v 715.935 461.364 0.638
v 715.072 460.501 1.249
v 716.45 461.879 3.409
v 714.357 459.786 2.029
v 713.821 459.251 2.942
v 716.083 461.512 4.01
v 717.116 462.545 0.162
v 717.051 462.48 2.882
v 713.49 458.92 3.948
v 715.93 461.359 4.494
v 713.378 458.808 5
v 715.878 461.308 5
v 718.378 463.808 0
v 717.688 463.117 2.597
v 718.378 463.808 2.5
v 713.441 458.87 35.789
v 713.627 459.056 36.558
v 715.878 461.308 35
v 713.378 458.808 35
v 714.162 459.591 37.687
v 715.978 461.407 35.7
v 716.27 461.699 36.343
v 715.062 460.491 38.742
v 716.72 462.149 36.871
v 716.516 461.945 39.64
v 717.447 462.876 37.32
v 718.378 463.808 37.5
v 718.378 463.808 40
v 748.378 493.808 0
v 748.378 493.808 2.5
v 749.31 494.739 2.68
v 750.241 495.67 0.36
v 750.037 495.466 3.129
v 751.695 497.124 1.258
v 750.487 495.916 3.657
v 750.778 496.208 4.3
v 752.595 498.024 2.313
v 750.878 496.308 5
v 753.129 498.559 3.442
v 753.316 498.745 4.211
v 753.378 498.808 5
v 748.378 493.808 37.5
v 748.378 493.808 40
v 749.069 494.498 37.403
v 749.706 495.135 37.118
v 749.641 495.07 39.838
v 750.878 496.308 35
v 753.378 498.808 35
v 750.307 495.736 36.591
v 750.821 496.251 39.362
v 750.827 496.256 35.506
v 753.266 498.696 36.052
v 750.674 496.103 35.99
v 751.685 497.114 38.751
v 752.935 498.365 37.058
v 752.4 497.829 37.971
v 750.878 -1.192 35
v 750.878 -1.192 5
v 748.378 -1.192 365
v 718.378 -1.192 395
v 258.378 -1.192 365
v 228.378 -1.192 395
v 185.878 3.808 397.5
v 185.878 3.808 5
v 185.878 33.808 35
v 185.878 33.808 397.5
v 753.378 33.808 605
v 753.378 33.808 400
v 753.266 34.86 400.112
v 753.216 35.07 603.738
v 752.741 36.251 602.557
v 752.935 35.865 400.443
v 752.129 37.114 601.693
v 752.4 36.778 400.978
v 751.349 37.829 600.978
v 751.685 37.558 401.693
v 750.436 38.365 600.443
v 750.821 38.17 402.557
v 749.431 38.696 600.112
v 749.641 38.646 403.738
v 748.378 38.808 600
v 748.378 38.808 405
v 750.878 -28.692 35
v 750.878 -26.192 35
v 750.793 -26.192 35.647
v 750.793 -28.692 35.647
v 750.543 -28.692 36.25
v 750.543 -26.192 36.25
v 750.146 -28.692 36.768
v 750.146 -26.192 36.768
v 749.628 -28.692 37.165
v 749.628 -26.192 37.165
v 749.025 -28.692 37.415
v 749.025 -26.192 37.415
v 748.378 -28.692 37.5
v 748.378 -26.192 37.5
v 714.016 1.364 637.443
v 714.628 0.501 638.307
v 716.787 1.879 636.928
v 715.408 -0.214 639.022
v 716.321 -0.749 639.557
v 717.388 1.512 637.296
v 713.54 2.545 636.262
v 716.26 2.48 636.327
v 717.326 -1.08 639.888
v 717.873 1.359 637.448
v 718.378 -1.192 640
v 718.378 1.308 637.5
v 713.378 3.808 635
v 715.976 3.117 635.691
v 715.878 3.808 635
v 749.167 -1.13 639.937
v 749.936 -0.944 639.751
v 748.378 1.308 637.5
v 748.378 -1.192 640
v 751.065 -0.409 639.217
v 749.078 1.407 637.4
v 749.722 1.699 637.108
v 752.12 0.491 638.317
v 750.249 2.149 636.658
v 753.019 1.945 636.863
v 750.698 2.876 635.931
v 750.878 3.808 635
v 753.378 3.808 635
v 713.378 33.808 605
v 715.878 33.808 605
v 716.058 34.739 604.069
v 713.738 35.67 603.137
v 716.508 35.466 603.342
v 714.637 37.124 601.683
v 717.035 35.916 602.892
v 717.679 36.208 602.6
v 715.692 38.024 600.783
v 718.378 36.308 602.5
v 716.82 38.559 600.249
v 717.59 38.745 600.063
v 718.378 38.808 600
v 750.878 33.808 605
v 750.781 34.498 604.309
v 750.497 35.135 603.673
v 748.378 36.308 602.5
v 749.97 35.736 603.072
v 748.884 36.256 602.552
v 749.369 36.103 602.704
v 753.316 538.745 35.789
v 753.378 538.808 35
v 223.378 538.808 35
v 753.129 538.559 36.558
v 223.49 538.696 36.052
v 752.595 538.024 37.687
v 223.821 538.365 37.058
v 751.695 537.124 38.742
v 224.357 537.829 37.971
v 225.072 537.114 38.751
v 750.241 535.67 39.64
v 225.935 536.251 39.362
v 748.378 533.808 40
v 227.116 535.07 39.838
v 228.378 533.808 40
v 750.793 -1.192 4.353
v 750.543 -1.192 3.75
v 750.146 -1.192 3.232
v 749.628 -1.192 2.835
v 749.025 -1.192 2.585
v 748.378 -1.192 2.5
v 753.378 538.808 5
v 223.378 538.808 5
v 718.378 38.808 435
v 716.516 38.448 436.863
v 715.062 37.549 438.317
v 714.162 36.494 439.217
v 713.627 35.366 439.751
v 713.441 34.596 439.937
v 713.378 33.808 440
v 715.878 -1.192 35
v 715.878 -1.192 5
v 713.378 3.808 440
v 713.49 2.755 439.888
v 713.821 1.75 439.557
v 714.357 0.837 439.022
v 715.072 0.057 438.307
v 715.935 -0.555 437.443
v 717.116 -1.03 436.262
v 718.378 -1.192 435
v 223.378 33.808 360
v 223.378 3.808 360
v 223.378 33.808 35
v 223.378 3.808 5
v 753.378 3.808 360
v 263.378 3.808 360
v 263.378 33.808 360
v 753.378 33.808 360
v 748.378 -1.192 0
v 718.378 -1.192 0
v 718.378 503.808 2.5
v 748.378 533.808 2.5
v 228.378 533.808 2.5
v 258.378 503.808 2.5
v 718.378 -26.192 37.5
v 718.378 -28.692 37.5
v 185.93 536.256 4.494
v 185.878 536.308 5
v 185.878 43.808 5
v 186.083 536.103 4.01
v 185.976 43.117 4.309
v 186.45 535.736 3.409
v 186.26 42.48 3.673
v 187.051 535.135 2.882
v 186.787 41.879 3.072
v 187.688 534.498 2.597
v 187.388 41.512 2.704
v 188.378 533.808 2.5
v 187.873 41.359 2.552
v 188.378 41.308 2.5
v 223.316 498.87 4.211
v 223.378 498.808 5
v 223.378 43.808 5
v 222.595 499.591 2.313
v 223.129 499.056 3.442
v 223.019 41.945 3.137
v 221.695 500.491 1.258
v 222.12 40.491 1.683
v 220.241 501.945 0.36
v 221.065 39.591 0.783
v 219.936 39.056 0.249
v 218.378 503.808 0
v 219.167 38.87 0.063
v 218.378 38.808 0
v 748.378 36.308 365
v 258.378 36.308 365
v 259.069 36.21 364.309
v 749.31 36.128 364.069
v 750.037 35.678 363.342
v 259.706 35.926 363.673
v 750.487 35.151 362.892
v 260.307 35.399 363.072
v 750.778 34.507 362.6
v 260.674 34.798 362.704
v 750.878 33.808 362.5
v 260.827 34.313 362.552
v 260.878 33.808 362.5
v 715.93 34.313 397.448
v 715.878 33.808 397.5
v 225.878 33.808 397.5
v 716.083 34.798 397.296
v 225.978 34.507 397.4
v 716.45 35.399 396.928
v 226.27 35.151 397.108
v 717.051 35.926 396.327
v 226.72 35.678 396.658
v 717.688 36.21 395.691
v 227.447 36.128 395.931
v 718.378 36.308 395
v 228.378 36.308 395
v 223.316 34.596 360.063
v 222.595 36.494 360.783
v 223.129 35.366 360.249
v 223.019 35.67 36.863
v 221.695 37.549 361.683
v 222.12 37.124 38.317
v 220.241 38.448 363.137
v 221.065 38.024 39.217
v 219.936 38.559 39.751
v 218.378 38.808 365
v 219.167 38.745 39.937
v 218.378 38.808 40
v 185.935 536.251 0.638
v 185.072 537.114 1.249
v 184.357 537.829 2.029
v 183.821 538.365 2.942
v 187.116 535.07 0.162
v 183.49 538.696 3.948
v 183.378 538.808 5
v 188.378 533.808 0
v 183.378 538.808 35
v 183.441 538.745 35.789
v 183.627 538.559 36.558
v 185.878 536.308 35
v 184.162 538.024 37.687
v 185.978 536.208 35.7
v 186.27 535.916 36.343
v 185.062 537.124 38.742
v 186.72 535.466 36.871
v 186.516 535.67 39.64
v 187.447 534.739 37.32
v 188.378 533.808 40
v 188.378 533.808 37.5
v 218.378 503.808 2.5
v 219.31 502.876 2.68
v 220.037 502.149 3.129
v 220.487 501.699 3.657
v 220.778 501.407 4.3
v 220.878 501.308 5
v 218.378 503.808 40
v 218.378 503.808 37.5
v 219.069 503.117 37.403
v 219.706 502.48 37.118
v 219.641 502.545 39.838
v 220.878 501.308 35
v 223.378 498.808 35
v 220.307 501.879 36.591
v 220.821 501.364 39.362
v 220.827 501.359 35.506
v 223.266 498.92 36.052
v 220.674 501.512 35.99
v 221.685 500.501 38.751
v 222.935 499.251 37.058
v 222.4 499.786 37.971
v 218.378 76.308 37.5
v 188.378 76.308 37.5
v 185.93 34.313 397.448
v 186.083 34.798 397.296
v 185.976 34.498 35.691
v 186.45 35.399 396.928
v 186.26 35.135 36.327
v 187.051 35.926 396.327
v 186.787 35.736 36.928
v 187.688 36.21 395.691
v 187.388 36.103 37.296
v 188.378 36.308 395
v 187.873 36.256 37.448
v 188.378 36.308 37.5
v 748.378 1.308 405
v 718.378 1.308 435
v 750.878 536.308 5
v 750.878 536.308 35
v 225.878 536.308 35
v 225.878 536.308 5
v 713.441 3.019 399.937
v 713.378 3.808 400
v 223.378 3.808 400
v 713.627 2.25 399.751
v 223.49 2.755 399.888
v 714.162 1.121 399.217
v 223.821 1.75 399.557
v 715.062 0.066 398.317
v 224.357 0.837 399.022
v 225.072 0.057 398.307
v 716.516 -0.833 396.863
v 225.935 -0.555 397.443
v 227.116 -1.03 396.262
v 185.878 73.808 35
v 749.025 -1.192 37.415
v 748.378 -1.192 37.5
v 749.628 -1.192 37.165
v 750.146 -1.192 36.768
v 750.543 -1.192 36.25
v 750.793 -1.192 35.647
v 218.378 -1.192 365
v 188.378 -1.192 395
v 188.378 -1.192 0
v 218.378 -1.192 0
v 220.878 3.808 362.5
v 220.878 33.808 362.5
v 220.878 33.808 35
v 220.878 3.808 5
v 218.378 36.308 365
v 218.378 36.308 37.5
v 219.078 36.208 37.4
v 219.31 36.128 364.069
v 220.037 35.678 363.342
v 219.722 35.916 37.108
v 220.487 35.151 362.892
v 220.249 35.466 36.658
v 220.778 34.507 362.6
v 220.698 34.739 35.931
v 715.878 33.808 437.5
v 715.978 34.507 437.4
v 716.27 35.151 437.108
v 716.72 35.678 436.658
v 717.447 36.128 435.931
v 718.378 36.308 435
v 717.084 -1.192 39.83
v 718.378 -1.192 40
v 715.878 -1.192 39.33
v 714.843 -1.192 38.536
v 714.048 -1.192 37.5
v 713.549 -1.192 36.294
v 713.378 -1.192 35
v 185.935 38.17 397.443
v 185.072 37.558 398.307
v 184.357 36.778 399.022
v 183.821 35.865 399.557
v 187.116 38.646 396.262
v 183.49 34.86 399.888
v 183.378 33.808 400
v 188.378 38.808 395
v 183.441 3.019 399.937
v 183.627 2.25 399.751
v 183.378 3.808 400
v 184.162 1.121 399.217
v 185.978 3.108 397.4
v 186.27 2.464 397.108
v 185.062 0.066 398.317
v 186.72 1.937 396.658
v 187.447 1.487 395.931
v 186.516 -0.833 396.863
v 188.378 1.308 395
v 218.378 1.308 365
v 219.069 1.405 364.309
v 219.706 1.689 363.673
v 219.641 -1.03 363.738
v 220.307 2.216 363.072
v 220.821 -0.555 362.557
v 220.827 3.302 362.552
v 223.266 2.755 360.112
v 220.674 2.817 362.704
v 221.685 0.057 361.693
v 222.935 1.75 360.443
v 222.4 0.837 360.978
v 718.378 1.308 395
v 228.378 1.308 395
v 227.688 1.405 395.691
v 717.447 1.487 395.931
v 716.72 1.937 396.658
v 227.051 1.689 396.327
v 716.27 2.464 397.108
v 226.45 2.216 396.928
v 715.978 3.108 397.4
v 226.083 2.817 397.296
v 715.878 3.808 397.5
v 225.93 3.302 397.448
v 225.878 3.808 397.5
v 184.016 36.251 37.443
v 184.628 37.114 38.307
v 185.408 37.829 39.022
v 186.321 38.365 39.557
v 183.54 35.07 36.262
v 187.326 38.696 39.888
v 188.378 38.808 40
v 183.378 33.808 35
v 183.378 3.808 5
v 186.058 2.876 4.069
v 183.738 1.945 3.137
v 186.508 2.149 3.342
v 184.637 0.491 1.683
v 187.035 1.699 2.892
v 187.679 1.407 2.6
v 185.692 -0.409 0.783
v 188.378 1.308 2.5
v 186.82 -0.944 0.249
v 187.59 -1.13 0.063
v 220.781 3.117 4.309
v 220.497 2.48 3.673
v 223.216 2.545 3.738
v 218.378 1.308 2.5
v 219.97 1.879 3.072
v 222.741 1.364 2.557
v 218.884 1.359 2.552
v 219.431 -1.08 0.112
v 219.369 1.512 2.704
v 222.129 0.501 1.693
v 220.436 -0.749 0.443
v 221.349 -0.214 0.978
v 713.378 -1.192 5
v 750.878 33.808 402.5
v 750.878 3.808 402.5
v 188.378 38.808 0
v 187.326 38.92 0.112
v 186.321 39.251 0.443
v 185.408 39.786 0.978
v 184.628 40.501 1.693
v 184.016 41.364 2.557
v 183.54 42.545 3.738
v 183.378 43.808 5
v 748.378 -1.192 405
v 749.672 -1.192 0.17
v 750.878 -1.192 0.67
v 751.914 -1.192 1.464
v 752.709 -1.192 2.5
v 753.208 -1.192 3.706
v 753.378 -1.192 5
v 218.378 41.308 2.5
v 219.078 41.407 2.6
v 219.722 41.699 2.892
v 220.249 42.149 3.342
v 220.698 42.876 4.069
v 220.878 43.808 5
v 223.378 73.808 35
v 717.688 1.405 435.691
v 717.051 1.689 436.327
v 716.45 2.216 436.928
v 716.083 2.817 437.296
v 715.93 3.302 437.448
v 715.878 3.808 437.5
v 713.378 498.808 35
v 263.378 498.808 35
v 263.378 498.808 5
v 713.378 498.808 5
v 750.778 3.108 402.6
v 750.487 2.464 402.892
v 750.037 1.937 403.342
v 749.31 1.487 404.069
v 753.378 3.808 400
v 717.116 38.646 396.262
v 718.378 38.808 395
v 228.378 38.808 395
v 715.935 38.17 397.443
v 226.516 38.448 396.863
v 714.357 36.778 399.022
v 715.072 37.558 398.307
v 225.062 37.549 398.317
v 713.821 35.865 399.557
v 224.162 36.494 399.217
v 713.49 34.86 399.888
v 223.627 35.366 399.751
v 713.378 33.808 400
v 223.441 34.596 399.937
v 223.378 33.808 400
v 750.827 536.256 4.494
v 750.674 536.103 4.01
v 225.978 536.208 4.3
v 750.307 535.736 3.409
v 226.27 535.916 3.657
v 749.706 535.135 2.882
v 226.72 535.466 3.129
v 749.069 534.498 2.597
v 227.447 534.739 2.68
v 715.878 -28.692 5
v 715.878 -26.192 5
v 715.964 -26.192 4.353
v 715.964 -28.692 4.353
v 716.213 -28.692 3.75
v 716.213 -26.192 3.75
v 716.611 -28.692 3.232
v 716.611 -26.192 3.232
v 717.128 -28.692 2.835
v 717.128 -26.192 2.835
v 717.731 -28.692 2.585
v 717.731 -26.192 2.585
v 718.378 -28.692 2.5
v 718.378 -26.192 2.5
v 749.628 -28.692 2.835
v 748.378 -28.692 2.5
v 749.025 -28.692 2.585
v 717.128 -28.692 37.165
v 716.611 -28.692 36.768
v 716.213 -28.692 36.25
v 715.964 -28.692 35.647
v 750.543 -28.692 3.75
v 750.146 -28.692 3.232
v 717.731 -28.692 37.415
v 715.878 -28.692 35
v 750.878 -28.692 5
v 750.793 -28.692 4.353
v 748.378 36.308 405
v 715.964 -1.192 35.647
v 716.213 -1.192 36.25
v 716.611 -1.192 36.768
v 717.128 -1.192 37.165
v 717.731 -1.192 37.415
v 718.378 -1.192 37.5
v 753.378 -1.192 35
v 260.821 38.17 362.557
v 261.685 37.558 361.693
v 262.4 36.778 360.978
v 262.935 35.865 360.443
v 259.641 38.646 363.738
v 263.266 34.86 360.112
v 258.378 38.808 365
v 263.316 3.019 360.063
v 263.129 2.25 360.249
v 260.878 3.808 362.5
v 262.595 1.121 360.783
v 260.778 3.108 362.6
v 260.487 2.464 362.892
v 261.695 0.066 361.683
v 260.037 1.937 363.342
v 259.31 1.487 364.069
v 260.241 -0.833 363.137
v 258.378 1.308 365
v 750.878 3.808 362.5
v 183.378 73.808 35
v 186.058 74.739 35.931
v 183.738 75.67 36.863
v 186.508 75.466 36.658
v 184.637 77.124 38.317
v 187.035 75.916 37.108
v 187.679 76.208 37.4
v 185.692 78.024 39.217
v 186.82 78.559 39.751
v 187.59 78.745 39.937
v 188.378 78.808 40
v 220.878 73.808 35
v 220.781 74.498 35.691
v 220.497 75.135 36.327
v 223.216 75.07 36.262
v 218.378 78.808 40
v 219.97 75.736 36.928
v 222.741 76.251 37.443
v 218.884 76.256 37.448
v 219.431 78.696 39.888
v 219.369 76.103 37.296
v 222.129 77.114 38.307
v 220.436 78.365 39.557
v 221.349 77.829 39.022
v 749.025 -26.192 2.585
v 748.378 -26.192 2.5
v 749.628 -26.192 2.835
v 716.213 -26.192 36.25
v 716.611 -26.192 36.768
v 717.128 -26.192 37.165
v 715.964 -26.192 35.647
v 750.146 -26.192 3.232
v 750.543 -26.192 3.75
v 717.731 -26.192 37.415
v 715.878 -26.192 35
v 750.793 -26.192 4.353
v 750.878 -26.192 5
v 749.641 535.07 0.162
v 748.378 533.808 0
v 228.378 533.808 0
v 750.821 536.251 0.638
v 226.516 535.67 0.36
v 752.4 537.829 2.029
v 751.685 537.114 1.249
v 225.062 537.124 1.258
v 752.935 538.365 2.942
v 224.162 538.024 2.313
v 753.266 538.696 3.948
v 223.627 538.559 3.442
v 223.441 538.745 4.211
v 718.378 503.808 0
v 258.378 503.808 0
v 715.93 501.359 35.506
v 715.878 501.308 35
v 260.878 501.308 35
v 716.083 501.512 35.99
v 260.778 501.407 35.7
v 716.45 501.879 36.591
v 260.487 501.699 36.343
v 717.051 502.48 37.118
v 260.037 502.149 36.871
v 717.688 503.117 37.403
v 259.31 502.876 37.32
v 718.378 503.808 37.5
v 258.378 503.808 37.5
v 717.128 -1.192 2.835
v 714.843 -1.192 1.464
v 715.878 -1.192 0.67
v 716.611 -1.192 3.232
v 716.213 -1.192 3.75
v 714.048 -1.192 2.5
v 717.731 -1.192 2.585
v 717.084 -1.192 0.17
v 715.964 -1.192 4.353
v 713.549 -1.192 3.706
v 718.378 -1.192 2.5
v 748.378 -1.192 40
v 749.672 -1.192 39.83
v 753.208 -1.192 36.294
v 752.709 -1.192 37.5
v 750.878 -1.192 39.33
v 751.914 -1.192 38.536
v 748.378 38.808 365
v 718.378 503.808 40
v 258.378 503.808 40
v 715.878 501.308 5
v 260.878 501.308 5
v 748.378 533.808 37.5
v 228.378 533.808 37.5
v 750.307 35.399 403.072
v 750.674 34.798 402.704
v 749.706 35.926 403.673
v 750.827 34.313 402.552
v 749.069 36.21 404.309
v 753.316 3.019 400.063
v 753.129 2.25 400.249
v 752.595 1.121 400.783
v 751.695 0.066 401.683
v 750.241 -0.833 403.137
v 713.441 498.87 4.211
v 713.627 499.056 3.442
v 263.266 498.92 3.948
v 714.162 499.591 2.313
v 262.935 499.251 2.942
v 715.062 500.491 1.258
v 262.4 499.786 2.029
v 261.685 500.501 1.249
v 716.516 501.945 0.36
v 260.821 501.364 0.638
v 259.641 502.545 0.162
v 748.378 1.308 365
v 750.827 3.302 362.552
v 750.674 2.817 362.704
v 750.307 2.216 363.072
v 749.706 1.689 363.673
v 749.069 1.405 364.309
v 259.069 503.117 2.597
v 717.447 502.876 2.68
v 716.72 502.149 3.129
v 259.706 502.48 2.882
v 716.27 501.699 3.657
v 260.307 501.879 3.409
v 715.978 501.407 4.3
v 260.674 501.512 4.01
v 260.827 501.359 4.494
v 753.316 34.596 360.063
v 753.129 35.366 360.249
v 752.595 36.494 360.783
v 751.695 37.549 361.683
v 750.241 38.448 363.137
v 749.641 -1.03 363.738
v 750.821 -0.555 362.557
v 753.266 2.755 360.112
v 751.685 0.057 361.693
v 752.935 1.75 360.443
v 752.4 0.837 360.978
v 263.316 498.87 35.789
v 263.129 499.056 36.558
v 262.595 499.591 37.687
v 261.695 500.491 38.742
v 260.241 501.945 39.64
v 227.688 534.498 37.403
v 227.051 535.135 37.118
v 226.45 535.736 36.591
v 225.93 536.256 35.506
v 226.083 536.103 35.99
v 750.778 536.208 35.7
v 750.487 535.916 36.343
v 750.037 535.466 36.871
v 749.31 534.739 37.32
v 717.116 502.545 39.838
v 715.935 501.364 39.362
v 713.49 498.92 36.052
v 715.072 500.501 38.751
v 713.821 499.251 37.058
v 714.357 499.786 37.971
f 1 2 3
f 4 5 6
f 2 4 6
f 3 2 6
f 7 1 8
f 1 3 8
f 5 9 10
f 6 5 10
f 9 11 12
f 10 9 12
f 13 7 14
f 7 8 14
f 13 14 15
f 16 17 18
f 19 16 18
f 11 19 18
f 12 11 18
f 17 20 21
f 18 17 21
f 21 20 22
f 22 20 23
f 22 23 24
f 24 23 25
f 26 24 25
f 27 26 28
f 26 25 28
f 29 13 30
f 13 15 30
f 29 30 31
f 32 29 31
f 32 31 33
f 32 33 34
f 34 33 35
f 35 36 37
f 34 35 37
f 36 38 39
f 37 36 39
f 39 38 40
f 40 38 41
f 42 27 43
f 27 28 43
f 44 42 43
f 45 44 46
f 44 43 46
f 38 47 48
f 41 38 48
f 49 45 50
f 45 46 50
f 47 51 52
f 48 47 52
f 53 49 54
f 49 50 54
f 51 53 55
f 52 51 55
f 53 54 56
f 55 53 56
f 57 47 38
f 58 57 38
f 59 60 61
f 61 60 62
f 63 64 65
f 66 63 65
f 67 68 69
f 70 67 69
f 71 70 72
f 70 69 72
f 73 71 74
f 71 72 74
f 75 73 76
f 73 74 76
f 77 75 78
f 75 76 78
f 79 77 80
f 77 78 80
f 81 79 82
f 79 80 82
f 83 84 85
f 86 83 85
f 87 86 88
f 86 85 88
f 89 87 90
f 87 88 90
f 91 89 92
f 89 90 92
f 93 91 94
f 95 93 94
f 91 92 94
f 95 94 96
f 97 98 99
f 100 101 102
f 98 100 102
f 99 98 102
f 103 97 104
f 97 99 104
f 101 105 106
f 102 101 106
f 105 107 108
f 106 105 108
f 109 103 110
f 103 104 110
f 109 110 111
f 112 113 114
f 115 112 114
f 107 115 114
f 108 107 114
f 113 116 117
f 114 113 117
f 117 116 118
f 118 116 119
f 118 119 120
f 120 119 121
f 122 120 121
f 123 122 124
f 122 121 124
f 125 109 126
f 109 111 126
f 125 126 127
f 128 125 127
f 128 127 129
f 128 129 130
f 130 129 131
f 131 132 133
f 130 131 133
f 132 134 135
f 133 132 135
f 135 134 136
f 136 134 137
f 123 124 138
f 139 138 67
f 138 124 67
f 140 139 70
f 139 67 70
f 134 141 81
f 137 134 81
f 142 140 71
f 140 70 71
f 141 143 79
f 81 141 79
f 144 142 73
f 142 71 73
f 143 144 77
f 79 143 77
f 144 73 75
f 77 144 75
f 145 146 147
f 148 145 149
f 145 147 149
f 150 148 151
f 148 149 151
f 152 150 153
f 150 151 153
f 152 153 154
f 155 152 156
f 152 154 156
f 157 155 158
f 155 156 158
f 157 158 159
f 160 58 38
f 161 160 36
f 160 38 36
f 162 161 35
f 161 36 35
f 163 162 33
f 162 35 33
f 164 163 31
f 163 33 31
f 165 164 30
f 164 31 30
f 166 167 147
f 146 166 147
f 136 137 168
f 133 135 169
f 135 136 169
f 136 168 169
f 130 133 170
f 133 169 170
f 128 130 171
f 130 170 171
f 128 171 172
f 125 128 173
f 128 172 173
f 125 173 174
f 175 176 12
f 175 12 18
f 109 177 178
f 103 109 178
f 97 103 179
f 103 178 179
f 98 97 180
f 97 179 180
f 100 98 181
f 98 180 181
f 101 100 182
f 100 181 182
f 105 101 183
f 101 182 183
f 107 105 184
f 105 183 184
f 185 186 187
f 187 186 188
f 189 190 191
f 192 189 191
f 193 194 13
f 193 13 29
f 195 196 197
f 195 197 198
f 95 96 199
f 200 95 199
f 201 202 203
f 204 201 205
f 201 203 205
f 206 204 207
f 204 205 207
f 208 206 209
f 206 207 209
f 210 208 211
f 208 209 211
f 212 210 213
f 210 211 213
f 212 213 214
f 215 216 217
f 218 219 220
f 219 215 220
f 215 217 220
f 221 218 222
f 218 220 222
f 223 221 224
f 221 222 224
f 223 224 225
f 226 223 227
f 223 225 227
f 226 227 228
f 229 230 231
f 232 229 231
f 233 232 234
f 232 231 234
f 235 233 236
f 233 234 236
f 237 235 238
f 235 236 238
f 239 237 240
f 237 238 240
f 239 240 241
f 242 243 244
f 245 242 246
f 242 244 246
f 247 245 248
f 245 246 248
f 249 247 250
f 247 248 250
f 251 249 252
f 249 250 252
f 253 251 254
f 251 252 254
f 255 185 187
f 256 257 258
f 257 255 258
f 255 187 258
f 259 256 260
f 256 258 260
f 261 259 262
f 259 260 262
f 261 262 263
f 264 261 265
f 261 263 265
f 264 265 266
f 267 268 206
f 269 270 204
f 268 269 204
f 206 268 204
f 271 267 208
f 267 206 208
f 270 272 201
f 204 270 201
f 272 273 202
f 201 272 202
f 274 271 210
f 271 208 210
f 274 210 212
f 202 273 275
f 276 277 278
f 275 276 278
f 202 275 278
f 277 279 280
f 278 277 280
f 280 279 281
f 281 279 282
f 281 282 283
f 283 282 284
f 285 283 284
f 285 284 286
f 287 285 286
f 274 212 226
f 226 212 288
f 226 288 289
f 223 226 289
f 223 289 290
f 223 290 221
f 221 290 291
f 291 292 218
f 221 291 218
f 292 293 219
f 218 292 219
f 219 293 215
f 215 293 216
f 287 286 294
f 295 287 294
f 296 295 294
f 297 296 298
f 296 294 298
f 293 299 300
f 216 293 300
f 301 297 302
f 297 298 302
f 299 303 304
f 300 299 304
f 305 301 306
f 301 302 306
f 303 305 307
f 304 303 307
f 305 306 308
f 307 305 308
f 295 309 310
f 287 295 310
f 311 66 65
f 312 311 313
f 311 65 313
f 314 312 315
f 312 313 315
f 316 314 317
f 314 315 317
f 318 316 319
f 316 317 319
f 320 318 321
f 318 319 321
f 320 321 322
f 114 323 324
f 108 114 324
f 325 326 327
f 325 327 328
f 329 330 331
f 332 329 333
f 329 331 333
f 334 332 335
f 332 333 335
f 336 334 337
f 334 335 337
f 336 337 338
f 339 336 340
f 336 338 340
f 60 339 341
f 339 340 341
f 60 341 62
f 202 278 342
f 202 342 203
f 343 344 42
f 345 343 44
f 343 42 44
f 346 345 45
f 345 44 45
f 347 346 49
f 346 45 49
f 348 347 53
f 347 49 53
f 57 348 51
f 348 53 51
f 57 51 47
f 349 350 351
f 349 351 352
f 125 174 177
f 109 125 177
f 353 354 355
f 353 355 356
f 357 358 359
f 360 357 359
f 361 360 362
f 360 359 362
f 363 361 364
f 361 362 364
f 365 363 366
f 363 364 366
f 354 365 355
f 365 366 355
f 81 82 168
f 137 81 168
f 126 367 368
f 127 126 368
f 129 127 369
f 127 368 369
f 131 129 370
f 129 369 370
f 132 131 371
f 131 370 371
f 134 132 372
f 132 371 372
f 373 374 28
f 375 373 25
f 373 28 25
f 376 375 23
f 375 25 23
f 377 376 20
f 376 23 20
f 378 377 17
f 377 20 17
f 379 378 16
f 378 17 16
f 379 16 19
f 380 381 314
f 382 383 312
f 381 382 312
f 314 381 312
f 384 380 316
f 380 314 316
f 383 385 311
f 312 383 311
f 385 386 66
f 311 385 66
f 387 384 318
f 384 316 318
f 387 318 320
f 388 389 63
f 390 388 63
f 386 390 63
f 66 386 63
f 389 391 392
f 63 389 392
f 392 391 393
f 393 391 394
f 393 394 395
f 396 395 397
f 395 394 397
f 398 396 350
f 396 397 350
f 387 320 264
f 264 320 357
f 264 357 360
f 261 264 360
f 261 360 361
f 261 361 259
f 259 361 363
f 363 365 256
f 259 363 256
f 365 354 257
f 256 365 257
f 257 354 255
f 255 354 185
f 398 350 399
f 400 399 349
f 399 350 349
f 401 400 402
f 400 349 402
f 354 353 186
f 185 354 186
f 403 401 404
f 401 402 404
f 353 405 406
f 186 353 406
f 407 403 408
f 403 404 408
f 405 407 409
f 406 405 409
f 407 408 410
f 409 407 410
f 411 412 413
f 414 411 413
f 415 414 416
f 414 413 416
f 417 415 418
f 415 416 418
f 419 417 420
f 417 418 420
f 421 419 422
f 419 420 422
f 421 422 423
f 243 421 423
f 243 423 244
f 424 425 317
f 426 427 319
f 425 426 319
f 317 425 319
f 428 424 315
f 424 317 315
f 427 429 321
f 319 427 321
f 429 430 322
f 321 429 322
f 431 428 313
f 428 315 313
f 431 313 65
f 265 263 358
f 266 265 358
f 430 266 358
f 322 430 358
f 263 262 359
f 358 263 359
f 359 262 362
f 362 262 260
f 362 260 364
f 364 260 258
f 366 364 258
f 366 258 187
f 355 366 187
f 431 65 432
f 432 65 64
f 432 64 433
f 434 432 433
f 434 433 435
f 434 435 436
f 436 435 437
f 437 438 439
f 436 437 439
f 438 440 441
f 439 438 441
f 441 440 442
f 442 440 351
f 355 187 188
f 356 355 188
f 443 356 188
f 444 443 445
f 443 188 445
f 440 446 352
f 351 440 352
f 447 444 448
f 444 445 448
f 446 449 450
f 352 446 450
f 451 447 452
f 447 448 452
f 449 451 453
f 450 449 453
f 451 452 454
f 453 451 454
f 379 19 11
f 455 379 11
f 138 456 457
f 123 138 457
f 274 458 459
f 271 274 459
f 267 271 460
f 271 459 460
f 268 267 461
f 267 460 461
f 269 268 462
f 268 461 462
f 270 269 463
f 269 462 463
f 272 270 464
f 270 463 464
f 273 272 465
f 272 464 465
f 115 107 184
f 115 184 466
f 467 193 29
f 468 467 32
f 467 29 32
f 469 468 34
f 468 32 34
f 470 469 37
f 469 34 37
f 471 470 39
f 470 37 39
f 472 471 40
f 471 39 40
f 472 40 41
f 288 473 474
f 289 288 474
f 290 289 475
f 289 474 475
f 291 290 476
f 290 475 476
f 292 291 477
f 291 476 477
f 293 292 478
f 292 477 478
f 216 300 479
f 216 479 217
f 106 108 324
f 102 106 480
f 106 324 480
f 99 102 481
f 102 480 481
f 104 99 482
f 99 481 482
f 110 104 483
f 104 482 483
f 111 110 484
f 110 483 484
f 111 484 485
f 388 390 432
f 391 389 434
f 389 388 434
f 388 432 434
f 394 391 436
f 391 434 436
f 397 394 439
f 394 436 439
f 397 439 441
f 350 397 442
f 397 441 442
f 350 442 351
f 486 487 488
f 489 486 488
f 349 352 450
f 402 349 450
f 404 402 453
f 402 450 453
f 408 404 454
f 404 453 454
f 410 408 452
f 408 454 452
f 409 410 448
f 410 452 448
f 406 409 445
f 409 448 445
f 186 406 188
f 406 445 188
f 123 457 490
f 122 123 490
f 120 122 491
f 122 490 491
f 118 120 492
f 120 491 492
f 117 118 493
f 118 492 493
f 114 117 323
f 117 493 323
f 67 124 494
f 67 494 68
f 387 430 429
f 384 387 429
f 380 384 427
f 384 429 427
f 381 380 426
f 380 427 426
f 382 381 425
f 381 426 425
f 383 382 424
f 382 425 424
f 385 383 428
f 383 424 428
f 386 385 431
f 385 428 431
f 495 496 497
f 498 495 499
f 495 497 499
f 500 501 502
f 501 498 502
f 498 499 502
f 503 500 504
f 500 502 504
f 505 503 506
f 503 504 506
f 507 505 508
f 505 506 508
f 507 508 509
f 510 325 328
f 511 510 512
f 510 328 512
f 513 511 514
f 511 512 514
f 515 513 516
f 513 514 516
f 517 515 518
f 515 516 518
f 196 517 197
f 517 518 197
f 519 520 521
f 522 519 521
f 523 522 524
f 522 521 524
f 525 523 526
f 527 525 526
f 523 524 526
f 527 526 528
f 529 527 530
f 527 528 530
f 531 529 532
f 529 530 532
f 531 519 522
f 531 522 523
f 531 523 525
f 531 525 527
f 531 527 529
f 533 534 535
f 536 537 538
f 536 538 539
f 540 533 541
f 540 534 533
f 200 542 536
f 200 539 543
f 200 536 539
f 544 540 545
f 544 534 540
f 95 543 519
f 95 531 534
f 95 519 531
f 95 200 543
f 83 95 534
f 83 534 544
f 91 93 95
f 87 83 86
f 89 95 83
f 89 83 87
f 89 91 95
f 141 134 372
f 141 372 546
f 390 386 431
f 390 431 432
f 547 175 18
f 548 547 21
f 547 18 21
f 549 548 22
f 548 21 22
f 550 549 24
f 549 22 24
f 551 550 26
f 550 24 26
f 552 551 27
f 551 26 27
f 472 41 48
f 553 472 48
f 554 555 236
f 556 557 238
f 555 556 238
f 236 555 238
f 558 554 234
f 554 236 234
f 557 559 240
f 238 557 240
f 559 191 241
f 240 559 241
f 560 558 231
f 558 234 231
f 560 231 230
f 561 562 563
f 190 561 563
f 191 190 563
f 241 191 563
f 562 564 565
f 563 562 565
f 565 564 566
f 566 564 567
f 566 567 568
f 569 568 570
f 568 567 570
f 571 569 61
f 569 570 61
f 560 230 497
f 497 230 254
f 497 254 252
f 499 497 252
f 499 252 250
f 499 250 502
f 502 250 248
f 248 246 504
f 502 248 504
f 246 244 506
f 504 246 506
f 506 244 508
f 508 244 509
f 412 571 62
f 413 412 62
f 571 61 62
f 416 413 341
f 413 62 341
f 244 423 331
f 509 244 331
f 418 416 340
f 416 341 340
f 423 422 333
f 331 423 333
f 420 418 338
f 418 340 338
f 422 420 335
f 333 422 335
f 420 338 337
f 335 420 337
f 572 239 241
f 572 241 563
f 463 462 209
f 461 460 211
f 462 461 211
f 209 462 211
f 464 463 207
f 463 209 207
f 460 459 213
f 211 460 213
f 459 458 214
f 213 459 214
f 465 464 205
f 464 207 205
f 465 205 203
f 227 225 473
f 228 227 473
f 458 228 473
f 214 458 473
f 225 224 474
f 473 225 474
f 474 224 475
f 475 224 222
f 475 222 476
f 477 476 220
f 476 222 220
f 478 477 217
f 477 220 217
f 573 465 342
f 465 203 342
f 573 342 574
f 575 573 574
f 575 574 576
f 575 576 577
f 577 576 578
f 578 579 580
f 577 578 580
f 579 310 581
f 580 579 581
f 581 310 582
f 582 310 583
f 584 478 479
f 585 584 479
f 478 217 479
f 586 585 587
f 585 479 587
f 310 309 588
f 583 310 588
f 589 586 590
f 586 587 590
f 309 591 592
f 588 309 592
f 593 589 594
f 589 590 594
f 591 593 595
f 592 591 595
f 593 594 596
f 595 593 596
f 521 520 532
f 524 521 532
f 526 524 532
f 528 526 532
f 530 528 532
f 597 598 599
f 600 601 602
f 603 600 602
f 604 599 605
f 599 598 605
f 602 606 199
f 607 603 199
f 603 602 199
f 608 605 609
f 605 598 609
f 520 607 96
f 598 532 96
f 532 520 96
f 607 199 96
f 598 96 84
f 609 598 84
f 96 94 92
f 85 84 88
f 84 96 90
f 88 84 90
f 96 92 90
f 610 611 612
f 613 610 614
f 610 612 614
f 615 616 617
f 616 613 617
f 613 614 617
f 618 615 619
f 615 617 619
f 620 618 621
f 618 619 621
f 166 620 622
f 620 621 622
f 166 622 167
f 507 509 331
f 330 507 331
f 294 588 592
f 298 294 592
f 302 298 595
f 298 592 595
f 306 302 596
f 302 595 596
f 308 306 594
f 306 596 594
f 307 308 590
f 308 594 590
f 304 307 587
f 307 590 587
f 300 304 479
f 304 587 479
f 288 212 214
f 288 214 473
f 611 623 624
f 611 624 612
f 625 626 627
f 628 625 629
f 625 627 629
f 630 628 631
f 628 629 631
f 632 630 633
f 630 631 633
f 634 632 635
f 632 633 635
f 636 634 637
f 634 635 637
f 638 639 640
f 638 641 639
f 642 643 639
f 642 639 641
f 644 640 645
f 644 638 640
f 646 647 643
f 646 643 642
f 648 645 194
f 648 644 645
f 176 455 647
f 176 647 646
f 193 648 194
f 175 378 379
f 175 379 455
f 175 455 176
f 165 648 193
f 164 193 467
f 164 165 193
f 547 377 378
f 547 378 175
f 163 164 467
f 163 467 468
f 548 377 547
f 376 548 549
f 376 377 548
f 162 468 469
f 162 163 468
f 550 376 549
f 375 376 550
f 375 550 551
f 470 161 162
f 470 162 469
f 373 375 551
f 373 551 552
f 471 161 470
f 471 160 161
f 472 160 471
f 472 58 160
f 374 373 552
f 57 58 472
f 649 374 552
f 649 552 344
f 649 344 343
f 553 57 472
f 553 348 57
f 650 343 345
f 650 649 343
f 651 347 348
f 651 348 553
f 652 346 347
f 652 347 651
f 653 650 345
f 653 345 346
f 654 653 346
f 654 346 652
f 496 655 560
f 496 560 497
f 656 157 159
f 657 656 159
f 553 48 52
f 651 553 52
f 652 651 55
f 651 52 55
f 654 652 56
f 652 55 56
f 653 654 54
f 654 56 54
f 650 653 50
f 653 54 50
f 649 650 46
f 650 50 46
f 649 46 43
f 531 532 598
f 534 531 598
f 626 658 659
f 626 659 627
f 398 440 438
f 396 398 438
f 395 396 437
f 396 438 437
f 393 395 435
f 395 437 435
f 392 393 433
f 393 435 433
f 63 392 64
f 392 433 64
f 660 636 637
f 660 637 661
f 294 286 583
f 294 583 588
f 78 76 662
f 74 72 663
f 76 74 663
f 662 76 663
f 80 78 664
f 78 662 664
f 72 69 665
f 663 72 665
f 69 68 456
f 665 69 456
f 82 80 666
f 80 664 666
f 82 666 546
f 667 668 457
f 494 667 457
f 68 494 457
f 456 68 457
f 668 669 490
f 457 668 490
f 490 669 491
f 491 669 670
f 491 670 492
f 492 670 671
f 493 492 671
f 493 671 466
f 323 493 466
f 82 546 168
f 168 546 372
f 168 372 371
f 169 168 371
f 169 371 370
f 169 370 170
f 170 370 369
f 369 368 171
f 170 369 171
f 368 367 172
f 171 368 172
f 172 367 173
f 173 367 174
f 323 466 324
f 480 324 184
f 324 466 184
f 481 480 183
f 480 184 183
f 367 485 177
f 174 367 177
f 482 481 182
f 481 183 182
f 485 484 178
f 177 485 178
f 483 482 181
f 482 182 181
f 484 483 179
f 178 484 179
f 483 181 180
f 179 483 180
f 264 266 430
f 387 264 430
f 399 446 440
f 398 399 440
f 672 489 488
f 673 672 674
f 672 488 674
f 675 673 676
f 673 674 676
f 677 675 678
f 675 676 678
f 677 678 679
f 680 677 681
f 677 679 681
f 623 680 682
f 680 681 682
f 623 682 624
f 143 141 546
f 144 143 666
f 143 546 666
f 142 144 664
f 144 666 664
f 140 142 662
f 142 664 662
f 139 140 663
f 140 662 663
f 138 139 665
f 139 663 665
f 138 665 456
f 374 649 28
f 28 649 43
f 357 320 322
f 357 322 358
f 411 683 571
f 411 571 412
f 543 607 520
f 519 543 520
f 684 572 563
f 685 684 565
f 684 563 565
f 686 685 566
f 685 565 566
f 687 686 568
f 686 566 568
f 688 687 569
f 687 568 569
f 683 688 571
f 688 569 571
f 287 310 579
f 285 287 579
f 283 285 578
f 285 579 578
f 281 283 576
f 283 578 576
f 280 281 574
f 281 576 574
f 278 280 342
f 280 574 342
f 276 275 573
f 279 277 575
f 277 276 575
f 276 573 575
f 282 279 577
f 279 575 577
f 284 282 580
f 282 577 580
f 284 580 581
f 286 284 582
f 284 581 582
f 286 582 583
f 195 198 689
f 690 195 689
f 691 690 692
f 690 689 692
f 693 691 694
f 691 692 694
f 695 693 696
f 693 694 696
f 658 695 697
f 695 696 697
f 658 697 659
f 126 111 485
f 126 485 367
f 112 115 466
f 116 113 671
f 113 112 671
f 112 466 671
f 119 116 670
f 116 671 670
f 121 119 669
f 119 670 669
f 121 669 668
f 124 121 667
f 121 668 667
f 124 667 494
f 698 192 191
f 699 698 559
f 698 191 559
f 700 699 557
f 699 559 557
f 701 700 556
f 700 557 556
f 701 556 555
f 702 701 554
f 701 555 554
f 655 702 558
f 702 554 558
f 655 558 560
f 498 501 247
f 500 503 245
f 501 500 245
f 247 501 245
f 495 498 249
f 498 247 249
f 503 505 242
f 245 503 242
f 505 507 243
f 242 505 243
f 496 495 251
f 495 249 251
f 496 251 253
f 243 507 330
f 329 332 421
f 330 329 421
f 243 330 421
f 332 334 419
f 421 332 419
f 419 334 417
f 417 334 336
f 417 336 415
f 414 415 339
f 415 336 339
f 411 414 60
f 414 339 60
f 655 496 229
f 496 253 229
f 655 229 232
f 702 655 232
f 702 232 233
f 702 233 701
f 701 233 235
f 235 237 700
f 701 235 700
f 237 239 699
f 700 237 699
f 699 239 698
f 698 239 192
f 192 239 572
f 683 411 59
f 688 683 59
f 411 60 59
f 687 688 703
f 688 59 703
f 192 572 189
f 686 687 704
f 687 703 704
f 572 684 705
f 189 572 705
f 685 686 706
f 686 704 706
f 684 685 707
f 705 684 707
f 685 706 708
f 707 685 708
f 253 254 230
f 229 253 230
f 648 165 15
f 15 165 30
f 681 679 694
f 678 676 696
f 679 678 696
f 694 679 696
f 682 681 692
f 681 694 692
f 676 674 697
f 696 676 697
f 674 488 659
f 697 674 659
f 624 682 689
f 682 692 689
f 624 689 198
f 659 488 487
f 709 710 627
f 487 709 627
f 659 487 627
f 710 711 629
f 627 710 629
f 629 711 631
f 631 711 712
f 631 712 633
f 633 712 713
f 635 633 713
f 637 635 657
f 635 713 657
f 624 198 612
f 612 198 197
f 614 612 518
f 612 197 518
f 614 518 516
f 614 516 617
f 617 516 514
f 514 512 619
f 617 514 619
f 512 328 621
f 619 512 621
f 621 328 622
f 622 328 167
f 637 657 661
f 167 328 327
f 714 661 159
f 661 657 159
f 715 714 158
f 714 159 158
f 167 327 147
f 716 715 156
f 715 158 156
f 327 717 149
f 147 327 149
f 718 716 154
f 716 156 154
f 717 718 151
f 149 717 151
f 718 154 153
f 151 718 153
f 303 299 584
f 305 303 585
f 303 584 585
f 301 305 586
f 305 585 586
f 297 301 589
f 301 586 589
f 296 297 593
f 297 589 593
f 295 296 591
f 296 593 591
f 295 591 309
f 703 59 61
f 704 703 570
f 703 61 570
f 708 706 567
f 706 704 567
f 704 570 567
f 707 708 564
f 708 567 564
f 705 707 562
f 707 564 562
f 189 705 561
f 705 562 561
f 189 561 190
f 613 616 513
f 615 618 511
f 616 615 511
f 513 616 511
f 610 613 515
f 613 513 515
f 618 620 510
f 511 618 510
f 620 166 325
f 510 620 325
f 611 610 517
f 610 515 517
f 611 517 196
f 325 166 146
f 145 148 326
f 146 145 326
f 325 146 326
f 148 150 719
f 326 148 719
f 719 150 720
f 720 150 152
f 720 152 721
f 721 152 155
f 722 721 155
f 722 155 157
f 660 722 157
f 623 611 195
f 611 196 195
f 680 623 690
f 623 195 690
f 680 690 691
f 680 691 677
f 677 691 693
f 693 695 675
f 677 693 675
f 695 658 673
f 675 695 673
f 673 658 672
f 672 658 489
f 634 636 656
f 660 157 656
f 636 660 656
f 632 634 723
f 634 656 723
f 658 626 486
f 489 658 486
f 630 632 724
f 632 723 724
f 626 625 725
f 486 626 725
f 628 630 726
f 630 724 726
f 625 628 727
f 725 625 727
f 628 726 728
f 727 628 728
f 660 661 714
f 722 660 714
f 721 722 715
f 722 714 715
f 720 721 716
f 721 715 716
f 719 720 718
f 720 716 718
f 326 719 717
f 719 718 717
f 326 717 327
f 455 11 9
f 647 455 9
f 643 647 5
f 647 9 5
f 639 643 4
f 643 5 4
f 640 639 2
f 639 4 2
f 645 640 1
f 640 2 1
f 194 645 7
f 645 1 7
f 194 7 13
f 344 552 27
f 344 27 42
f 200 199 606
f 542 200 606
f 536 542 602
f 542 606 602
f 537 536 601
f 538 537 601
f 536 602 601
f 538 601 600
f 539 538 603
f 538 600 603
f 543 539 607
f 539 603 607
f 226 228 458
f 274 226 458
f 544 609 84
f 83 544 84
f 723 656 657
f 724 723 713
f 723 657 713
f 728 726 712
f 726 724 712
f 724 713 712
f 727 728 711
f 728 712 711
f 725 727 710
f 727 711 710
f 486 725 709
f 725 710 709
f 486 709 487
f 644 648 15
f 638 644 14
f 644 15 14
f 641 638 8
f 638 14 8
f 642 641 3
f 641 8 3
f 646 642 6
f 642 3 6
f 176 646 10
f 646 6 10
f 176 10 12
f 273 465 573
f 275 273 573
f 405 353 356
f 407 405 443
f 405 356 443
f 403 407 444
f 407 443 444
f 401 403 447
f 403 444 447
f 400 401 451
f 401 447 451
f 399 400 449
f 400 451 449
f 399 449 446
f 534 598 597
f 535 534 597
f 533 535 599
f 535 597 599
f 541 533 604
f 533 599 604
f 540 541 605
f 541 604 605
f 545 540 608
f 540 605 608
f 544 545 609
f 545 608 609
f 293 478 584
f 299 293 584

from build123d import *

# Parameters (mm, degrees)
F1_DEPTH  = 500
F3_DEPTH  = 40.001
F5_DEPTH  = 530
F7_DEPTH  = 264.2357556353
F10_DEPTH = 259.001
F14_DEPTH = 400
F16_DEPTH = 455.4894368181
F18_DEPTH = 531.1934248934
F20_DEPTH = 530
F22_DEPTH = 531.1934248934
F24_DEPTH = 240
F26_DEPTH = 531.1934248934
F28_DEPTH = 985.4894368181
F30_DEPTH = 500
F32_DEPTH = 985.4894368181
F34_DEPTH = 640.001
F37_DEPTH = 500
F39_DEPTH = 40.001
F41_DEPTH = 40.001
F43_DEPTH = 530
F45_DEPTH = 40.001
F47_DEPTH = 500
F49_DEPTH = 40.001
F52_DEPTH = 2.5


with BuildPart() as f1:
    # F0 (on Front) → F1 (new body)
    with BuildSketch(Plane.XZ):
        with BuildLine():
            ThreePointArc((0, 5), (1.4644660941, 1.4644660941), (5, 0))
            Line((5, 0), (35, 0))
            ThreePointArc((35, 0), (38.5355339059, 1.4644660941), (40, 5))
            Line((40, 5), (40, 35))
            ThreePointArc((40, 35), (38.5355339059, 38.5355339059), (35, 40))
            Line((35, 40), (5, 40))
            ThreePointArc((5, 40), (1.4644660941, 38.5355339059), (0, 35))
            Line((0, 35), (0, 5))
        make_face()
        with BuildLine():
            ThreePointArc((2.5, 35), (3.232233047, 36.767766953), (5, 37.5))
            Line((5, 37.5), (35, 37.5))
            ThreePointArc((35, 37.5), (36.767766953, 36.767766953), (37.5, 35))
            Line((37.5, 35), (37.5, 5))
            ThreePointArc((37.5, 5), (36.767766953, 3.232233047), (35, 2.5))
            Line((35, 2.5), (5, 2.5))
            ThreePointArc((5, 2.5), (3.232233047, 3.232233047), (2.5, 5))
            Line((2.5, 5), (2.5, 35))
        make_face(mode=Mode.SUBTRACT)
    extrude(amount=-F1_DEPTH)

    # F2 (on face) → F3 (cut, through all)
    with BuildSketch(Plane.XY.offset(40)):
        Polygon((0, 460), (40, 500), (0, 500), align=None)
    extrude(amount=-F3_DEPTH, mode=Mode.SUBTRACT)


with BuildPart() as f5:
    # F4 (on Front) → F5 (new body)
    with BuildSketch(Plane.XZ):
        with BuildLine():
            ThreePointArc((-232.1100574732, 229.2347556353), (-230.6455913791, 225.6992217293), (-227.1100574732, 224.2347556353))
            Line((-227.1100574732, 224.2347556353), (-197.1100574732, 224.2347556353))
            ThreePointArc((-197.1100574732, 224.2347556353), (-193.5745235672, 225.6992217293), (-192.1100574732, 229.2347556353))
            Line((-192.1100574732, 229.2347556353), (-192.1100574732, 259.2347556353))
            ThreePointArc((-192.1100574732, 259.2347556353), (-193.5745235672, 262.7702895412), (-197.1100574732, 264.2347556353))
            Line((-197.1100574732, 264.2347556353), (-227.1100574732, 264.2347556353))
            ThreePointArc((-227.1100574732, 264.2347556353), (-230.6455913791, 262.7702895412), (-232.1100574732, 259.2347556353))
            Line((-232.1100574732, 259.2347556353), (-232.1100574732, 229.2347556353))
        make_face()
        with BuildLine():
            ThreePointArc((-229.6100574732, 259.2347556353), (-228.8778244261, 261.0025225882), (-227.1100574732, 261.7347556353))
            Line((-227.1100574732, 261.7347556353), (-197.1100574732, 261.7347556353))
            ThreePointArc((-197.1100574732, 261.7347556353), (-195.3422905202, 261.0025225882), (-194.6100574732, 259.2347556353))
            Line((-194.6100574732, 259.2347556353), (-194.6100574732, 229.2347556353))
            ThreePointArc((-194.6100574732, 229.2347556353), (-195.3422905202, 227.4669886823), (-197.1100574732, 226.7347556353))
            Line((-197.1100574732, 226.7347556353), (-227.1100574732, 226.7347556353))
            ThreePointArc((-227.1100574732, 226.7347556353), (-228.8778244261, 227.4669886823), (-229.6100574732, 229.2347556353))
            Line((-229.6100574732, 229.2347556353), (-229.6100574732, 259.2347556353))
        make_face(mode=Mode.SUBTRACT)
    extrude(amount=-F5_DEPTH)

    # F6 (on face) → F7 (cut, through all)
    with BuildSketch(Plane.XY.offset(264.2347556353)):
        Polygon((-232.1100574732, 40), (-232.1100574732, 0), (-192.1100574732, 0), align=None)
        Polygon((-192.1100574732, 530), (-232.1100574732, 530), (-232.1100574732, 490), align=None)
    extrude(amount=-F7_DEPTH, mode=Mode.SUBTRACT)


with BuildPart() as f8_1:
    # F8: copy of F1
    add(f1.part.moved(Location((-219, 0, 7))))


with BuildPart() as f10_tool:
    # F9 (on face) → F10 (new body, through all)
    with BuildSketch(Plane(origin=(-219, 0, 0), x_dir=(0, -1, 0), z_dir=(-1, 0, 0))):
        Polygon((-40, 7), (0, 7), (0, 47), align=None)
    extrude(amount=-F10_DEPTH)


with BuildPart() as f1_1:
    add(f1.part)

    # F10: cut by f10_tool
    add(f10_tool.part, mode=Mode.SUBTRACT)


with BuildPart() as f8_1_1:
    add(f8_1.part)

    # F10: cut by f10_tool
    add(f10_tool.part, mode=Mode.SUBTRACT)


with BuildPart() as f11_1:
    # F11: copy of F1
    add(f1_1.part.moved(Location((124, 2, 116))))


with BuildPart() as f14:
    # F13 (on Top) → F14 (new body)
    with BuildSketch(Plane.XY):
        with BuildLine():
            ThreePointArc((183.3783793449, 3.8075751066), (184.842845439, 0.2720412007), (188.3783793449, -1.1924248934))
            Line((188.3783793449, -1.1924248934), (218.3783793449, -1.1924248934))
            ThreePointArc((218.3783793449, -1.1924248934), (221.9139132509, 0.2720412007), (223.3783793449, 3.8075751066))
            Line((223.3783793449, 3.8075751066), (223.3783793449, 33.8075751066))
            ThreePointArc((223.3783793449, 33.8075751066), (221.9139132509, 37.3431090126), (218.3783793449, 38.8075751066))
            Line((218.3783793449, 38.8075751066), (188.3783793449, 38.8075751066))
            ThreePointArc((188.3783793449, 38.8075751066), (184.842845439, 37.3431090126), (183.3783793449, 33.8075751066))
            Line((183.3783793449, 33.8075751066), (183.3783793449, 3.8075751066))
        make_face()
        with BuildLine():
            ThreePointArc((185.8783793449, 33.8075751066), (186.610612392, 35.5753420596), (188.3783793449, 36.3075751066))
            Line((188.3783793449, 36.3075751066), (218.3783793449, 36.3075751066))
            ThreePointArc((218.3783793449, 36.3075751066), (220.1461462979, 35.5753420596), (220.8783793449, 33.8075751066))
            Line((220.8783793449, 33.8075751066), (220.8783793449, 3.8075751066))
            ThreePointArc((220.8783793449, 3.8075751066), (220.1461462979, 2.0398081537), (218.3783793449, 1.3075751066))
            Line((218.3783793449, 1.3075751066), (188.3783793449, 1.3075751066))
            ThreePointArc((188.3783793449, 1.3075751066), (186.610612392, 2.0398081537), (185.8783793449, 3.8075751066))
            Line((185.8783793449, 3.8075751066), (185.8783793449, 33.8075751066))
        make_face(mode=Mode.SUBTRACT)
    extrude(amount=F14_DEPTH)


with BuildPart() as f16_tool:
    # F15 (on face) → F16 (new body, through all)
    with BuildSketch(Plane.YZ.offset(223.3783793449)):
        Polygon((-1.1924248934, 0), (38.8075751066, 0), (38.8075751066, 40), align=None)
    extrude(amount=-F16_DEPTH)


with BuildPart() as f1_2:
    add(f1_1.part)

    # F16: cut by f16_tool
    add(f16_tool.part, mode=Mode.SUBTRACT)


with BuildPart() as f8_1_2:
    add(f8_1_1.part)

    # F16: cut by f16_tool
    add(f16_tool.part, mode=Mode.SUBTRACT)


with BuildPart() as f14_1:
    add(f14.part)

    # F16: cut by f16_tool
    add(f16_tool.part, mode=Mode.SUBTRACT)

    # F17 (on face) → F18 (cut, through all)
    with BuildSketch(Plane.XZ.offset(1.1924248934)):
        Polygon((223.3783793449, 400), (183.3783793449, 400), (223.3783793449, 360), align=None)
    extrude(amount=-F18_DEPTH, mode=Mode.SUBTRACT)


with BuildPart() as f20:
    # F19 (on face) → F20 (new body)
    with BuildSketch(Plane.YZ.offset(223.3783793449)):
        with BuildLine():
            ThreePointArc((-1.1924248934, 365), (0.2720412007, 361.4644660941), (3.8075751066, 360))
            Line((3.8075751066, 360), (33.8075751066, 360))
            ThreePointArc((33.8075751066, 360), (37.3431090126, 361.4644660941), (38.8075751066, 365))
            Line((38.8075751066, 365), (38.8075751066, 395))
            ThreePointArc((38.8075751066, 395), (37.3431090126, 398.5355339059), (33.8075751066, 400))
            Line((33.8075751066, 400), (3.8075751066, 400))
            ThreePointArc((3.8075751066, 400), (0.2720412007, 398.5355339059), (-1.1924248934, 395))
            Line((-1.1924248934, 395), (-1.1924248934, 365))
        make_face()
        with BuildLine():
            ThreePointArc((1.3075751066, 395), (2.0398081537, 396.767766953), (3.8075751066, 397.5))
            Line((3.8075751066, 397.5), (33.8075751066, 397.5))
            ThreePointArc((33.8075751066, 397.5), (35.5753420596, 396.767766953), (36.3075751066, 395))
            Line((36.3075751066, 395), (36.3075751066, 365))
            ThreePointArc((36.3075751066, 365), (35.5753420596, 363.232233047), (33.8075751066, 362.5))
            Line((33.8075751066, 362.5), (3.8075751066, 362.5))
            ThreePointArc((3.8075751066, 362.5), (2.0398081537, 363.232233047), (1.3075751066, 365))
            Line((1.3075751066, 365), (1.3075751066, 395))
        make_face(mode=Mode.SUBTRACT)
    extrude(amount=F20_DEPTH)

    # F21 (on face) → F22 (cut, through all)
    with BuildSketch(Plane.XZ.offset(1.1924248934)):
        Polygon((263.3783793449, 360), (223.3783793449, 400), (223.3783793449, 360), align=None)
        Polygon((753.3783793449, 360), (753.3783793449, 400), (713.3783793449, 400), align=None)
    extrude(amount=-F22_DEPTH, mode=Mode.SUBTRACT)


with BuildPart() as f24:
    # F23 (on face) → F24 (new body)
    with BuildSketch(Plane.XY.offset(400)):
        with BuildLine():
            ThreePointArc((713.3783793449, 3.8075751066), (714.842845439, 0.2720412007), (718.3783793449, -1.1924248934))
            Line((718.3783793449, -1.1924248934), (748.3783793449, -1.1924248934))
            ThreePointArc((748.3783793449, -1.1924248934), (751.9139132509, 0.2720412007), (753.3783793449, 3.8075751066))
            Line((753.3783793449, 3.8075751066), (753.3783793449, 33.8075751066))
            ThreePointArc((753.3783793449, 33.8075751066), (751.9139132509, 37.3431090126), (748.3783793449, 38.8075751066))
            Line((748.3783793449, 38.8075751066), (718.3783793449, 38.8075751066))
            ThreePointArc((718.3783793449, 38.8075751066), (714.842845439, 37.3431090126), (713.3783793449, 33.8075751066))
            Line((713.3783793449, 33.8075751066), (713.3783793449, 3.8075751066))
        make_face()
        with BuildLine():
            ThreePointArc((715.8783793449, 33.8075751066), (716.610612392, 35.5753420596), (718.3783793449, 36.3075751066))
            Line((718.3783793449, 36.3075751066), (748.3783793449, 36.3075751066))
            ThreePointArc((748.3783793449, 36.3075751066), (750.1461462979, 35.5753420596), (750.8783793449, 33.8075751066))
            Line((750.8783793449, 33.8075751066), (750.8783793449, 3.8075751066))
            ThreePointArc((750.8783793449, 3.8075751066), (750.1461462979, 2.0398081537), (748.3783793449, 1.3075751066))
            Line((748.3783793449, 1.3075751066), (718.3783793449, 1.3075751066))
            ThreePointArc((718.3783793449, 1.3075751066), (716.610612392, 2.0398081537), (715.8783793449, 3.8075751066))
            Line((715.8783793449, 3.8075751066), (715.8783793449, 33.8075751066))
        make_face(mode=Mode.SUBTRACT)
    extrude(amount=F24_DEPTH)

    # F25 (on face) → F26 (cut, through all)
    with BuildSketch(Plane.XZ.offset(1.1924248934)):
        Polygon((713.3783793449, 400), (753.3783793449, 400), (713.3783793449, 440), align=None)
    extrude(amount=-F26_DEPTH, mode=Mode.SUBTRACT)

    # F27 (on face) → F28 (cut, through all)
    with BuildSketch(Plane.YZ.offset(753.3783793449)):
        Polygon((38.8075751066, 640), (-1.1924248934, 640), (38.8075751066, 600), align=None)
    extrude(amount=-F28_DEPTH, mode=Mode.SUBTRACT)


with BuildPart() as f30:
    # F29 (on face) → F30 (new body)
    with BuildSketch(Plane(origin=(0, 38.8075751066, 0), x_dir=(-1, 0, 0), z_dir=(0, 1, 0))):
        with BuildLine():
            ThreePointArc((-753.3783793449, 605), (-751.9139132509, 601.4644660941), (-748.3783793449, 600))
            Line((-748.3783793449, 600), (-718.3783793449, 600))
            ThreePointArc((-718.3783793449, 600), (-714.842845439, 601.4644660941), (-713.3783793449, 605))
            Line((-713.3783793449, 605), (-713.3783793449, 635))
            ThreePointArc((-713.3783793449, 635), (-714.842845439, 638.5355339059), (-718.3783793449, 640))
            Line((-718.3783793449, 640), (-748.3783793449, 640))
            ThreePointArc((-748.3783793449, 640), (-751.9139132509, 638.5355339059), (-753.3783793449, 635))
            Line((-753.3783793449, 635), (-753.3783793449, 605))
        make_face()
        with BuildLine():
            ThreePointArc((-750.8783793449, 635), (-750.1461462979, 636.767766953), (-748.3783793449, 637.5))
            Line((-748.3783793449, 637.5), (-718.3783793449, 637.5))
            ThreePointArc((-718.3783793449, 637.5), (-716.610612392, 636.767766953), (-715.8783793449, 635))
            Line((-715.8783793449, 635), (-715.8783793449, 605))
            ThreePointArc((-715.8783793449, 605), (-716.610612392, 603.232233047), (-718.3783793449, 602.5))
            Line((-718.3783793449, 602.5), (-748.3783793449, 602.5))
            ThreePointArc((-748.3783793449, 602.5), (-750.1461462979, 603.232233047), (-750.8783793449, 605))
            Line((-750.8783793449, 605), (-750.8783793449, 635))
        make_face(mode=Mode.SUBTRACT)
    extrude(amount=F30_DEPTH)

    # F31 (on face) → F32 (cut, through all)
    with BuildSketch(Plane.YZ.offset(753.3783793449)):
        Polygon((78.8075751066, 600), (38.8075751066, 640), (38.8075751066, 600), align=None)
    extrude(amount=-F32_DEPTH, mode=Mode.SUBTRACT)

    # F33 (on face) → F34 (cut, through all)
    with BuildSketch(Plane.XY.offset(640)):
        Polygon((753.3783793449, 538.8075751066), (713.3783793449, 538.8075751066), (713.3783793449, 498.8075751066), align=None)
    extrude(amount=-F34_DEPTH, mode=Mode.SUBTRACT)


with BuildPart() as f37:
    # F36 (on face) → F37 (new body)
    with BuildSketch(Plane(origin=(0, 38.8075751066, 0), x_dir=(-1, 0, 0), z_dir=(0, 1, 0))):
        with BuildLine():
            ThreePointArc((-223.3783793449, 5), (-221.9139132509, 1.4644660941), (-218.3783793449, 0))
            Line((-218.3783793449, 0), (-188.3783793449, 0))
            ThreePointArc((-188.3783793449, 0), (-184.842845439, 1.4644660941), (-183.3783793449, 5))
            Line((-183.3783793449, 5), (-183.3783793449, 35))
            ThreePointArc((-183.3783793449, 35), (-184.842845439, 38.5355339059), (-188.3783793449, 40))
            Line((-188.3783793449, 40), (-218.3783793449, 40))
            ThreePointArc((-218.3783793449, 40), (-221.9139132509, 38.5355339059), (-223.3783793449, 35))
            Line((-223.3783793449, 35), (-223.3783793449, 5))
        make_face()
        with BuildLine():
            ThreePointArc((-220.8783793449, 35), (-220.1461462979, 36.767766953), (-218.3783793449, 37.5))
            Line((-218.3783793449, 37.5), (-188.3783793449, 37.5))
            ThreePointArc((-188.3783793449, 37.5), (-186.610612392, 36.767766953), (-185.8783793449, 35))
            Line((-185.8783793449, 35), (-185.8783793449, 5))
            ThreePointArc((-185.8783793449, 5), (-186.610612392, 3.232233047), (-188.3783793449, 2.5))
            Line((-188.3783793449, 2.5), (-218.3783793449, 2.5))
            ThreePointArc((-218.3783793449, 2.5), (-220.1461462979, 3.232233047), (-220.8783793449, 5))
            Line((-220.8783793449, 5), (-220.8783793449, 35))
        make_face(mode=Mode.SUBTRACT)
    extrude(amount=F37_DEPTH)

    # F38 (on face) → F39 (cut, through all)
    with BuildSketch(Plane.YZ.offset(223.3783793449)):
        Polygon((38.8075751066, 0), (78.8075751066, 40), (38.8075751066, 40), align=None)
    extrude(amount=-F39_DEPTH, mode=Mode.SUBTRACT)

    # F40 (on face) → F41 (cut, through all)
    with BuildSketch(Plane.XY.offset(40)):
        Polygon((223.3783793449, 538.8075751066), (183.3783793449, 538.8075751066), (223.3783793449, 498.8075751066), align=None)
    extrude(amount=-F41_DEPTH, mode=Mode.SUBTRACT)


with BuildPart() as f43:
    # F42 (on face) → F43 (new body)
    with BuildSketch(Plane.YZ.offset(223.3783793449)):
        with BuildLine():
            ThreePointArc((498.8075751066, 5), (500.2720412007, 1.4644660941), (503.8075751066, 0))
            Line((503.8075751066, 0), (533.8075751066, 0))
            ThreePointArc((533.8075751066, 0), (537.3431090126, 1.4644660941), (538.8075751066, 5))
            Line((538.8075751066, 5), (538.8075751066, 35))
            ThreePointArc((538.8075751066, 35), (537.3431090126, 38.5355339059), (533.8075751066, 40))
            Line((533.8075751066, 40), (503.8075751066, 40))
            ThreePointArc((503.8075751066, 40), (500.2720412007, 38.5355339059), (498.8075751066, 35))
            Line((498.8075751066, 35), (498.8075751066, 5))
        make_face()
        with BuildLine():
            ThreePointArc((501.3075751066, 35), (502.0398081537, 36.767766953), (503.8075751066, 37.5))
            Line((503.8075751066, 37.5), (533.8075751066, 37.5))
            ThreePointArc((533.8075751066, 37.5), (535.5753420596, 36.767766953), (536.3075751066, 35))
            Line((536.3075751066, 35), (536.3075751066, 5))
            ThreePointArc((536.3075751066, 5), (535.5753420596, 3.232233047), (533.8075751066, 2.5))
            Line((533.8075751066, 2.5), (503.8075751066, 2.5))
            ThreePointArc((503.8075751066, 2.5), (502.0398081537, 3.232233047), (501.3075751066, 5))
            Line((501.3075751066, 5), (501.3075751066, 35))
        make_face(mode=Mode.SUBTRACT)
    extrude(amount=F43_DEPTH)

    # F44 (on face) → F45 (cut, through all)
    with BuildSketch(Plane.XY.offset(40)):
        Polygon((263.3783793449, 498.8075751066), (223.3783793449, 538.8075751066), (223.3783793449, 498.8075751066), align=None)
        Polygon((753.3783793449, 498.8075751066), (753.3783793449, 538.8075751066), (713.3783793449, 498.8075751066), align=None)
    extrude(amount=-F45_DEPTH, mode=Mode.SUBTRACT)


with BuildPart() as f47:
    # F46 (on face) → F47 (new body)
    with BuildSketch(Plane.XZ.offset(-498.8075751066)):
        with BuildLine():
            ThreePointArc((713.3783793449, 5), (714.842845439, 1.4644660941), (718.3783793449, 0))
            Line((718.3783793449, 0), (748.3783793449, 0))
            ThreePointArc((748.3783793449, 0), (751.9139132509, 1.4644660941), (753.3783793449, 5))
            Line((753.3783793449, 5), (753.3783793449, 35))
            ThreePointArc((753.3783793449, 35), (751.9139132509, 38.5355339059), (748.3783793449, 40))
            Line((748.3783793449, 40), (718.3783793449, 40))
            ThreePointArc((718.3783793449, 40), (714.842845439, 38.5355339059), (713.3783793449, 35))
            Line((713.3783793449, 35), (713.3783793449, 5))
        make_face()
        with BuildLine():
            ThreePointArc((715.8783793449, 35), (716.610612392, 36.767766953), (718.3783793449, 37.5))
            Line((718.3783793449, 37.5), (748.3783793449, 37.5))
            ThreePointArc((748.3783793449, 37.5), (750.1461462979, 36.767766953), (750.8783793449, 35))
            Line((750.8783793449, 35), (750.8783793449, 5))
            ThreePointArc((750.8783793449, 5), (750.1461462979, 3.232233047), (748.3783793449, 2.5))
            Line((748.3783793449, 2.5), (718.3783793449, 2.5))
            ThreePointArc((718.3783793449, 2.5), (716.610612392, 3.232233047), (715.8783793449, 5))
            Line((715.8783793449, 5), (715.8783793449, 35))
        make_face(mode=Mode.SUBTRACT)
    extrude(amount=F47_DEPTH)

    # F48 (on face) → F49 (cut, through all)
    with BuildSketch(Plane.XY.offset(40)):
        Polygon((713.3783793449, 458.8075751066), (753.3783793449, 498.8075751066), (713.3783793449, 498.8075751066), align=None)
    extrude(amount=-F49_DEPTH, mode=Mode.SUBTRACT)


with BuildPart() as f52:
    # F51 (on offset) → F52 (new body)
    with BuildSketch(Plane.XZ.offset(26.1924248934)):
        with BuildLine():
            Line((748.3783793449, 37.5), (718.3783793449, 37.5))
            ThreePointArc((718.3783793449, 37.5), (716.610612392, 36.767766953), (715.8783793449, 35))
            Line((715.8783793449, 35), (715.8783793449, 5))
            ThreePointArc((715.8783793449, 5), (716.610612392, 3.232233047), (718.3783793449, 2.5))
            Line((718.3783793449, 2.5), (748.3783793449, 2.5))
            ThreePointArc((748.3783793449, 2.5), (750.1461462979, 3.232233047), (750.8783793449, 5))
            Line((750.8783793449, 5), (750.8783793449, 35))
            ThreePointArc((750.8783793449, 35), (750.1461462979, 36.767766953), (748.3783793449, 37.5))
        make_face()
    extrude(amount=F52_DEPTH)


solid = Compound([f14_1.part, f20.part, f24.part, f37.part, f43.part, f47.part, f52.part])
